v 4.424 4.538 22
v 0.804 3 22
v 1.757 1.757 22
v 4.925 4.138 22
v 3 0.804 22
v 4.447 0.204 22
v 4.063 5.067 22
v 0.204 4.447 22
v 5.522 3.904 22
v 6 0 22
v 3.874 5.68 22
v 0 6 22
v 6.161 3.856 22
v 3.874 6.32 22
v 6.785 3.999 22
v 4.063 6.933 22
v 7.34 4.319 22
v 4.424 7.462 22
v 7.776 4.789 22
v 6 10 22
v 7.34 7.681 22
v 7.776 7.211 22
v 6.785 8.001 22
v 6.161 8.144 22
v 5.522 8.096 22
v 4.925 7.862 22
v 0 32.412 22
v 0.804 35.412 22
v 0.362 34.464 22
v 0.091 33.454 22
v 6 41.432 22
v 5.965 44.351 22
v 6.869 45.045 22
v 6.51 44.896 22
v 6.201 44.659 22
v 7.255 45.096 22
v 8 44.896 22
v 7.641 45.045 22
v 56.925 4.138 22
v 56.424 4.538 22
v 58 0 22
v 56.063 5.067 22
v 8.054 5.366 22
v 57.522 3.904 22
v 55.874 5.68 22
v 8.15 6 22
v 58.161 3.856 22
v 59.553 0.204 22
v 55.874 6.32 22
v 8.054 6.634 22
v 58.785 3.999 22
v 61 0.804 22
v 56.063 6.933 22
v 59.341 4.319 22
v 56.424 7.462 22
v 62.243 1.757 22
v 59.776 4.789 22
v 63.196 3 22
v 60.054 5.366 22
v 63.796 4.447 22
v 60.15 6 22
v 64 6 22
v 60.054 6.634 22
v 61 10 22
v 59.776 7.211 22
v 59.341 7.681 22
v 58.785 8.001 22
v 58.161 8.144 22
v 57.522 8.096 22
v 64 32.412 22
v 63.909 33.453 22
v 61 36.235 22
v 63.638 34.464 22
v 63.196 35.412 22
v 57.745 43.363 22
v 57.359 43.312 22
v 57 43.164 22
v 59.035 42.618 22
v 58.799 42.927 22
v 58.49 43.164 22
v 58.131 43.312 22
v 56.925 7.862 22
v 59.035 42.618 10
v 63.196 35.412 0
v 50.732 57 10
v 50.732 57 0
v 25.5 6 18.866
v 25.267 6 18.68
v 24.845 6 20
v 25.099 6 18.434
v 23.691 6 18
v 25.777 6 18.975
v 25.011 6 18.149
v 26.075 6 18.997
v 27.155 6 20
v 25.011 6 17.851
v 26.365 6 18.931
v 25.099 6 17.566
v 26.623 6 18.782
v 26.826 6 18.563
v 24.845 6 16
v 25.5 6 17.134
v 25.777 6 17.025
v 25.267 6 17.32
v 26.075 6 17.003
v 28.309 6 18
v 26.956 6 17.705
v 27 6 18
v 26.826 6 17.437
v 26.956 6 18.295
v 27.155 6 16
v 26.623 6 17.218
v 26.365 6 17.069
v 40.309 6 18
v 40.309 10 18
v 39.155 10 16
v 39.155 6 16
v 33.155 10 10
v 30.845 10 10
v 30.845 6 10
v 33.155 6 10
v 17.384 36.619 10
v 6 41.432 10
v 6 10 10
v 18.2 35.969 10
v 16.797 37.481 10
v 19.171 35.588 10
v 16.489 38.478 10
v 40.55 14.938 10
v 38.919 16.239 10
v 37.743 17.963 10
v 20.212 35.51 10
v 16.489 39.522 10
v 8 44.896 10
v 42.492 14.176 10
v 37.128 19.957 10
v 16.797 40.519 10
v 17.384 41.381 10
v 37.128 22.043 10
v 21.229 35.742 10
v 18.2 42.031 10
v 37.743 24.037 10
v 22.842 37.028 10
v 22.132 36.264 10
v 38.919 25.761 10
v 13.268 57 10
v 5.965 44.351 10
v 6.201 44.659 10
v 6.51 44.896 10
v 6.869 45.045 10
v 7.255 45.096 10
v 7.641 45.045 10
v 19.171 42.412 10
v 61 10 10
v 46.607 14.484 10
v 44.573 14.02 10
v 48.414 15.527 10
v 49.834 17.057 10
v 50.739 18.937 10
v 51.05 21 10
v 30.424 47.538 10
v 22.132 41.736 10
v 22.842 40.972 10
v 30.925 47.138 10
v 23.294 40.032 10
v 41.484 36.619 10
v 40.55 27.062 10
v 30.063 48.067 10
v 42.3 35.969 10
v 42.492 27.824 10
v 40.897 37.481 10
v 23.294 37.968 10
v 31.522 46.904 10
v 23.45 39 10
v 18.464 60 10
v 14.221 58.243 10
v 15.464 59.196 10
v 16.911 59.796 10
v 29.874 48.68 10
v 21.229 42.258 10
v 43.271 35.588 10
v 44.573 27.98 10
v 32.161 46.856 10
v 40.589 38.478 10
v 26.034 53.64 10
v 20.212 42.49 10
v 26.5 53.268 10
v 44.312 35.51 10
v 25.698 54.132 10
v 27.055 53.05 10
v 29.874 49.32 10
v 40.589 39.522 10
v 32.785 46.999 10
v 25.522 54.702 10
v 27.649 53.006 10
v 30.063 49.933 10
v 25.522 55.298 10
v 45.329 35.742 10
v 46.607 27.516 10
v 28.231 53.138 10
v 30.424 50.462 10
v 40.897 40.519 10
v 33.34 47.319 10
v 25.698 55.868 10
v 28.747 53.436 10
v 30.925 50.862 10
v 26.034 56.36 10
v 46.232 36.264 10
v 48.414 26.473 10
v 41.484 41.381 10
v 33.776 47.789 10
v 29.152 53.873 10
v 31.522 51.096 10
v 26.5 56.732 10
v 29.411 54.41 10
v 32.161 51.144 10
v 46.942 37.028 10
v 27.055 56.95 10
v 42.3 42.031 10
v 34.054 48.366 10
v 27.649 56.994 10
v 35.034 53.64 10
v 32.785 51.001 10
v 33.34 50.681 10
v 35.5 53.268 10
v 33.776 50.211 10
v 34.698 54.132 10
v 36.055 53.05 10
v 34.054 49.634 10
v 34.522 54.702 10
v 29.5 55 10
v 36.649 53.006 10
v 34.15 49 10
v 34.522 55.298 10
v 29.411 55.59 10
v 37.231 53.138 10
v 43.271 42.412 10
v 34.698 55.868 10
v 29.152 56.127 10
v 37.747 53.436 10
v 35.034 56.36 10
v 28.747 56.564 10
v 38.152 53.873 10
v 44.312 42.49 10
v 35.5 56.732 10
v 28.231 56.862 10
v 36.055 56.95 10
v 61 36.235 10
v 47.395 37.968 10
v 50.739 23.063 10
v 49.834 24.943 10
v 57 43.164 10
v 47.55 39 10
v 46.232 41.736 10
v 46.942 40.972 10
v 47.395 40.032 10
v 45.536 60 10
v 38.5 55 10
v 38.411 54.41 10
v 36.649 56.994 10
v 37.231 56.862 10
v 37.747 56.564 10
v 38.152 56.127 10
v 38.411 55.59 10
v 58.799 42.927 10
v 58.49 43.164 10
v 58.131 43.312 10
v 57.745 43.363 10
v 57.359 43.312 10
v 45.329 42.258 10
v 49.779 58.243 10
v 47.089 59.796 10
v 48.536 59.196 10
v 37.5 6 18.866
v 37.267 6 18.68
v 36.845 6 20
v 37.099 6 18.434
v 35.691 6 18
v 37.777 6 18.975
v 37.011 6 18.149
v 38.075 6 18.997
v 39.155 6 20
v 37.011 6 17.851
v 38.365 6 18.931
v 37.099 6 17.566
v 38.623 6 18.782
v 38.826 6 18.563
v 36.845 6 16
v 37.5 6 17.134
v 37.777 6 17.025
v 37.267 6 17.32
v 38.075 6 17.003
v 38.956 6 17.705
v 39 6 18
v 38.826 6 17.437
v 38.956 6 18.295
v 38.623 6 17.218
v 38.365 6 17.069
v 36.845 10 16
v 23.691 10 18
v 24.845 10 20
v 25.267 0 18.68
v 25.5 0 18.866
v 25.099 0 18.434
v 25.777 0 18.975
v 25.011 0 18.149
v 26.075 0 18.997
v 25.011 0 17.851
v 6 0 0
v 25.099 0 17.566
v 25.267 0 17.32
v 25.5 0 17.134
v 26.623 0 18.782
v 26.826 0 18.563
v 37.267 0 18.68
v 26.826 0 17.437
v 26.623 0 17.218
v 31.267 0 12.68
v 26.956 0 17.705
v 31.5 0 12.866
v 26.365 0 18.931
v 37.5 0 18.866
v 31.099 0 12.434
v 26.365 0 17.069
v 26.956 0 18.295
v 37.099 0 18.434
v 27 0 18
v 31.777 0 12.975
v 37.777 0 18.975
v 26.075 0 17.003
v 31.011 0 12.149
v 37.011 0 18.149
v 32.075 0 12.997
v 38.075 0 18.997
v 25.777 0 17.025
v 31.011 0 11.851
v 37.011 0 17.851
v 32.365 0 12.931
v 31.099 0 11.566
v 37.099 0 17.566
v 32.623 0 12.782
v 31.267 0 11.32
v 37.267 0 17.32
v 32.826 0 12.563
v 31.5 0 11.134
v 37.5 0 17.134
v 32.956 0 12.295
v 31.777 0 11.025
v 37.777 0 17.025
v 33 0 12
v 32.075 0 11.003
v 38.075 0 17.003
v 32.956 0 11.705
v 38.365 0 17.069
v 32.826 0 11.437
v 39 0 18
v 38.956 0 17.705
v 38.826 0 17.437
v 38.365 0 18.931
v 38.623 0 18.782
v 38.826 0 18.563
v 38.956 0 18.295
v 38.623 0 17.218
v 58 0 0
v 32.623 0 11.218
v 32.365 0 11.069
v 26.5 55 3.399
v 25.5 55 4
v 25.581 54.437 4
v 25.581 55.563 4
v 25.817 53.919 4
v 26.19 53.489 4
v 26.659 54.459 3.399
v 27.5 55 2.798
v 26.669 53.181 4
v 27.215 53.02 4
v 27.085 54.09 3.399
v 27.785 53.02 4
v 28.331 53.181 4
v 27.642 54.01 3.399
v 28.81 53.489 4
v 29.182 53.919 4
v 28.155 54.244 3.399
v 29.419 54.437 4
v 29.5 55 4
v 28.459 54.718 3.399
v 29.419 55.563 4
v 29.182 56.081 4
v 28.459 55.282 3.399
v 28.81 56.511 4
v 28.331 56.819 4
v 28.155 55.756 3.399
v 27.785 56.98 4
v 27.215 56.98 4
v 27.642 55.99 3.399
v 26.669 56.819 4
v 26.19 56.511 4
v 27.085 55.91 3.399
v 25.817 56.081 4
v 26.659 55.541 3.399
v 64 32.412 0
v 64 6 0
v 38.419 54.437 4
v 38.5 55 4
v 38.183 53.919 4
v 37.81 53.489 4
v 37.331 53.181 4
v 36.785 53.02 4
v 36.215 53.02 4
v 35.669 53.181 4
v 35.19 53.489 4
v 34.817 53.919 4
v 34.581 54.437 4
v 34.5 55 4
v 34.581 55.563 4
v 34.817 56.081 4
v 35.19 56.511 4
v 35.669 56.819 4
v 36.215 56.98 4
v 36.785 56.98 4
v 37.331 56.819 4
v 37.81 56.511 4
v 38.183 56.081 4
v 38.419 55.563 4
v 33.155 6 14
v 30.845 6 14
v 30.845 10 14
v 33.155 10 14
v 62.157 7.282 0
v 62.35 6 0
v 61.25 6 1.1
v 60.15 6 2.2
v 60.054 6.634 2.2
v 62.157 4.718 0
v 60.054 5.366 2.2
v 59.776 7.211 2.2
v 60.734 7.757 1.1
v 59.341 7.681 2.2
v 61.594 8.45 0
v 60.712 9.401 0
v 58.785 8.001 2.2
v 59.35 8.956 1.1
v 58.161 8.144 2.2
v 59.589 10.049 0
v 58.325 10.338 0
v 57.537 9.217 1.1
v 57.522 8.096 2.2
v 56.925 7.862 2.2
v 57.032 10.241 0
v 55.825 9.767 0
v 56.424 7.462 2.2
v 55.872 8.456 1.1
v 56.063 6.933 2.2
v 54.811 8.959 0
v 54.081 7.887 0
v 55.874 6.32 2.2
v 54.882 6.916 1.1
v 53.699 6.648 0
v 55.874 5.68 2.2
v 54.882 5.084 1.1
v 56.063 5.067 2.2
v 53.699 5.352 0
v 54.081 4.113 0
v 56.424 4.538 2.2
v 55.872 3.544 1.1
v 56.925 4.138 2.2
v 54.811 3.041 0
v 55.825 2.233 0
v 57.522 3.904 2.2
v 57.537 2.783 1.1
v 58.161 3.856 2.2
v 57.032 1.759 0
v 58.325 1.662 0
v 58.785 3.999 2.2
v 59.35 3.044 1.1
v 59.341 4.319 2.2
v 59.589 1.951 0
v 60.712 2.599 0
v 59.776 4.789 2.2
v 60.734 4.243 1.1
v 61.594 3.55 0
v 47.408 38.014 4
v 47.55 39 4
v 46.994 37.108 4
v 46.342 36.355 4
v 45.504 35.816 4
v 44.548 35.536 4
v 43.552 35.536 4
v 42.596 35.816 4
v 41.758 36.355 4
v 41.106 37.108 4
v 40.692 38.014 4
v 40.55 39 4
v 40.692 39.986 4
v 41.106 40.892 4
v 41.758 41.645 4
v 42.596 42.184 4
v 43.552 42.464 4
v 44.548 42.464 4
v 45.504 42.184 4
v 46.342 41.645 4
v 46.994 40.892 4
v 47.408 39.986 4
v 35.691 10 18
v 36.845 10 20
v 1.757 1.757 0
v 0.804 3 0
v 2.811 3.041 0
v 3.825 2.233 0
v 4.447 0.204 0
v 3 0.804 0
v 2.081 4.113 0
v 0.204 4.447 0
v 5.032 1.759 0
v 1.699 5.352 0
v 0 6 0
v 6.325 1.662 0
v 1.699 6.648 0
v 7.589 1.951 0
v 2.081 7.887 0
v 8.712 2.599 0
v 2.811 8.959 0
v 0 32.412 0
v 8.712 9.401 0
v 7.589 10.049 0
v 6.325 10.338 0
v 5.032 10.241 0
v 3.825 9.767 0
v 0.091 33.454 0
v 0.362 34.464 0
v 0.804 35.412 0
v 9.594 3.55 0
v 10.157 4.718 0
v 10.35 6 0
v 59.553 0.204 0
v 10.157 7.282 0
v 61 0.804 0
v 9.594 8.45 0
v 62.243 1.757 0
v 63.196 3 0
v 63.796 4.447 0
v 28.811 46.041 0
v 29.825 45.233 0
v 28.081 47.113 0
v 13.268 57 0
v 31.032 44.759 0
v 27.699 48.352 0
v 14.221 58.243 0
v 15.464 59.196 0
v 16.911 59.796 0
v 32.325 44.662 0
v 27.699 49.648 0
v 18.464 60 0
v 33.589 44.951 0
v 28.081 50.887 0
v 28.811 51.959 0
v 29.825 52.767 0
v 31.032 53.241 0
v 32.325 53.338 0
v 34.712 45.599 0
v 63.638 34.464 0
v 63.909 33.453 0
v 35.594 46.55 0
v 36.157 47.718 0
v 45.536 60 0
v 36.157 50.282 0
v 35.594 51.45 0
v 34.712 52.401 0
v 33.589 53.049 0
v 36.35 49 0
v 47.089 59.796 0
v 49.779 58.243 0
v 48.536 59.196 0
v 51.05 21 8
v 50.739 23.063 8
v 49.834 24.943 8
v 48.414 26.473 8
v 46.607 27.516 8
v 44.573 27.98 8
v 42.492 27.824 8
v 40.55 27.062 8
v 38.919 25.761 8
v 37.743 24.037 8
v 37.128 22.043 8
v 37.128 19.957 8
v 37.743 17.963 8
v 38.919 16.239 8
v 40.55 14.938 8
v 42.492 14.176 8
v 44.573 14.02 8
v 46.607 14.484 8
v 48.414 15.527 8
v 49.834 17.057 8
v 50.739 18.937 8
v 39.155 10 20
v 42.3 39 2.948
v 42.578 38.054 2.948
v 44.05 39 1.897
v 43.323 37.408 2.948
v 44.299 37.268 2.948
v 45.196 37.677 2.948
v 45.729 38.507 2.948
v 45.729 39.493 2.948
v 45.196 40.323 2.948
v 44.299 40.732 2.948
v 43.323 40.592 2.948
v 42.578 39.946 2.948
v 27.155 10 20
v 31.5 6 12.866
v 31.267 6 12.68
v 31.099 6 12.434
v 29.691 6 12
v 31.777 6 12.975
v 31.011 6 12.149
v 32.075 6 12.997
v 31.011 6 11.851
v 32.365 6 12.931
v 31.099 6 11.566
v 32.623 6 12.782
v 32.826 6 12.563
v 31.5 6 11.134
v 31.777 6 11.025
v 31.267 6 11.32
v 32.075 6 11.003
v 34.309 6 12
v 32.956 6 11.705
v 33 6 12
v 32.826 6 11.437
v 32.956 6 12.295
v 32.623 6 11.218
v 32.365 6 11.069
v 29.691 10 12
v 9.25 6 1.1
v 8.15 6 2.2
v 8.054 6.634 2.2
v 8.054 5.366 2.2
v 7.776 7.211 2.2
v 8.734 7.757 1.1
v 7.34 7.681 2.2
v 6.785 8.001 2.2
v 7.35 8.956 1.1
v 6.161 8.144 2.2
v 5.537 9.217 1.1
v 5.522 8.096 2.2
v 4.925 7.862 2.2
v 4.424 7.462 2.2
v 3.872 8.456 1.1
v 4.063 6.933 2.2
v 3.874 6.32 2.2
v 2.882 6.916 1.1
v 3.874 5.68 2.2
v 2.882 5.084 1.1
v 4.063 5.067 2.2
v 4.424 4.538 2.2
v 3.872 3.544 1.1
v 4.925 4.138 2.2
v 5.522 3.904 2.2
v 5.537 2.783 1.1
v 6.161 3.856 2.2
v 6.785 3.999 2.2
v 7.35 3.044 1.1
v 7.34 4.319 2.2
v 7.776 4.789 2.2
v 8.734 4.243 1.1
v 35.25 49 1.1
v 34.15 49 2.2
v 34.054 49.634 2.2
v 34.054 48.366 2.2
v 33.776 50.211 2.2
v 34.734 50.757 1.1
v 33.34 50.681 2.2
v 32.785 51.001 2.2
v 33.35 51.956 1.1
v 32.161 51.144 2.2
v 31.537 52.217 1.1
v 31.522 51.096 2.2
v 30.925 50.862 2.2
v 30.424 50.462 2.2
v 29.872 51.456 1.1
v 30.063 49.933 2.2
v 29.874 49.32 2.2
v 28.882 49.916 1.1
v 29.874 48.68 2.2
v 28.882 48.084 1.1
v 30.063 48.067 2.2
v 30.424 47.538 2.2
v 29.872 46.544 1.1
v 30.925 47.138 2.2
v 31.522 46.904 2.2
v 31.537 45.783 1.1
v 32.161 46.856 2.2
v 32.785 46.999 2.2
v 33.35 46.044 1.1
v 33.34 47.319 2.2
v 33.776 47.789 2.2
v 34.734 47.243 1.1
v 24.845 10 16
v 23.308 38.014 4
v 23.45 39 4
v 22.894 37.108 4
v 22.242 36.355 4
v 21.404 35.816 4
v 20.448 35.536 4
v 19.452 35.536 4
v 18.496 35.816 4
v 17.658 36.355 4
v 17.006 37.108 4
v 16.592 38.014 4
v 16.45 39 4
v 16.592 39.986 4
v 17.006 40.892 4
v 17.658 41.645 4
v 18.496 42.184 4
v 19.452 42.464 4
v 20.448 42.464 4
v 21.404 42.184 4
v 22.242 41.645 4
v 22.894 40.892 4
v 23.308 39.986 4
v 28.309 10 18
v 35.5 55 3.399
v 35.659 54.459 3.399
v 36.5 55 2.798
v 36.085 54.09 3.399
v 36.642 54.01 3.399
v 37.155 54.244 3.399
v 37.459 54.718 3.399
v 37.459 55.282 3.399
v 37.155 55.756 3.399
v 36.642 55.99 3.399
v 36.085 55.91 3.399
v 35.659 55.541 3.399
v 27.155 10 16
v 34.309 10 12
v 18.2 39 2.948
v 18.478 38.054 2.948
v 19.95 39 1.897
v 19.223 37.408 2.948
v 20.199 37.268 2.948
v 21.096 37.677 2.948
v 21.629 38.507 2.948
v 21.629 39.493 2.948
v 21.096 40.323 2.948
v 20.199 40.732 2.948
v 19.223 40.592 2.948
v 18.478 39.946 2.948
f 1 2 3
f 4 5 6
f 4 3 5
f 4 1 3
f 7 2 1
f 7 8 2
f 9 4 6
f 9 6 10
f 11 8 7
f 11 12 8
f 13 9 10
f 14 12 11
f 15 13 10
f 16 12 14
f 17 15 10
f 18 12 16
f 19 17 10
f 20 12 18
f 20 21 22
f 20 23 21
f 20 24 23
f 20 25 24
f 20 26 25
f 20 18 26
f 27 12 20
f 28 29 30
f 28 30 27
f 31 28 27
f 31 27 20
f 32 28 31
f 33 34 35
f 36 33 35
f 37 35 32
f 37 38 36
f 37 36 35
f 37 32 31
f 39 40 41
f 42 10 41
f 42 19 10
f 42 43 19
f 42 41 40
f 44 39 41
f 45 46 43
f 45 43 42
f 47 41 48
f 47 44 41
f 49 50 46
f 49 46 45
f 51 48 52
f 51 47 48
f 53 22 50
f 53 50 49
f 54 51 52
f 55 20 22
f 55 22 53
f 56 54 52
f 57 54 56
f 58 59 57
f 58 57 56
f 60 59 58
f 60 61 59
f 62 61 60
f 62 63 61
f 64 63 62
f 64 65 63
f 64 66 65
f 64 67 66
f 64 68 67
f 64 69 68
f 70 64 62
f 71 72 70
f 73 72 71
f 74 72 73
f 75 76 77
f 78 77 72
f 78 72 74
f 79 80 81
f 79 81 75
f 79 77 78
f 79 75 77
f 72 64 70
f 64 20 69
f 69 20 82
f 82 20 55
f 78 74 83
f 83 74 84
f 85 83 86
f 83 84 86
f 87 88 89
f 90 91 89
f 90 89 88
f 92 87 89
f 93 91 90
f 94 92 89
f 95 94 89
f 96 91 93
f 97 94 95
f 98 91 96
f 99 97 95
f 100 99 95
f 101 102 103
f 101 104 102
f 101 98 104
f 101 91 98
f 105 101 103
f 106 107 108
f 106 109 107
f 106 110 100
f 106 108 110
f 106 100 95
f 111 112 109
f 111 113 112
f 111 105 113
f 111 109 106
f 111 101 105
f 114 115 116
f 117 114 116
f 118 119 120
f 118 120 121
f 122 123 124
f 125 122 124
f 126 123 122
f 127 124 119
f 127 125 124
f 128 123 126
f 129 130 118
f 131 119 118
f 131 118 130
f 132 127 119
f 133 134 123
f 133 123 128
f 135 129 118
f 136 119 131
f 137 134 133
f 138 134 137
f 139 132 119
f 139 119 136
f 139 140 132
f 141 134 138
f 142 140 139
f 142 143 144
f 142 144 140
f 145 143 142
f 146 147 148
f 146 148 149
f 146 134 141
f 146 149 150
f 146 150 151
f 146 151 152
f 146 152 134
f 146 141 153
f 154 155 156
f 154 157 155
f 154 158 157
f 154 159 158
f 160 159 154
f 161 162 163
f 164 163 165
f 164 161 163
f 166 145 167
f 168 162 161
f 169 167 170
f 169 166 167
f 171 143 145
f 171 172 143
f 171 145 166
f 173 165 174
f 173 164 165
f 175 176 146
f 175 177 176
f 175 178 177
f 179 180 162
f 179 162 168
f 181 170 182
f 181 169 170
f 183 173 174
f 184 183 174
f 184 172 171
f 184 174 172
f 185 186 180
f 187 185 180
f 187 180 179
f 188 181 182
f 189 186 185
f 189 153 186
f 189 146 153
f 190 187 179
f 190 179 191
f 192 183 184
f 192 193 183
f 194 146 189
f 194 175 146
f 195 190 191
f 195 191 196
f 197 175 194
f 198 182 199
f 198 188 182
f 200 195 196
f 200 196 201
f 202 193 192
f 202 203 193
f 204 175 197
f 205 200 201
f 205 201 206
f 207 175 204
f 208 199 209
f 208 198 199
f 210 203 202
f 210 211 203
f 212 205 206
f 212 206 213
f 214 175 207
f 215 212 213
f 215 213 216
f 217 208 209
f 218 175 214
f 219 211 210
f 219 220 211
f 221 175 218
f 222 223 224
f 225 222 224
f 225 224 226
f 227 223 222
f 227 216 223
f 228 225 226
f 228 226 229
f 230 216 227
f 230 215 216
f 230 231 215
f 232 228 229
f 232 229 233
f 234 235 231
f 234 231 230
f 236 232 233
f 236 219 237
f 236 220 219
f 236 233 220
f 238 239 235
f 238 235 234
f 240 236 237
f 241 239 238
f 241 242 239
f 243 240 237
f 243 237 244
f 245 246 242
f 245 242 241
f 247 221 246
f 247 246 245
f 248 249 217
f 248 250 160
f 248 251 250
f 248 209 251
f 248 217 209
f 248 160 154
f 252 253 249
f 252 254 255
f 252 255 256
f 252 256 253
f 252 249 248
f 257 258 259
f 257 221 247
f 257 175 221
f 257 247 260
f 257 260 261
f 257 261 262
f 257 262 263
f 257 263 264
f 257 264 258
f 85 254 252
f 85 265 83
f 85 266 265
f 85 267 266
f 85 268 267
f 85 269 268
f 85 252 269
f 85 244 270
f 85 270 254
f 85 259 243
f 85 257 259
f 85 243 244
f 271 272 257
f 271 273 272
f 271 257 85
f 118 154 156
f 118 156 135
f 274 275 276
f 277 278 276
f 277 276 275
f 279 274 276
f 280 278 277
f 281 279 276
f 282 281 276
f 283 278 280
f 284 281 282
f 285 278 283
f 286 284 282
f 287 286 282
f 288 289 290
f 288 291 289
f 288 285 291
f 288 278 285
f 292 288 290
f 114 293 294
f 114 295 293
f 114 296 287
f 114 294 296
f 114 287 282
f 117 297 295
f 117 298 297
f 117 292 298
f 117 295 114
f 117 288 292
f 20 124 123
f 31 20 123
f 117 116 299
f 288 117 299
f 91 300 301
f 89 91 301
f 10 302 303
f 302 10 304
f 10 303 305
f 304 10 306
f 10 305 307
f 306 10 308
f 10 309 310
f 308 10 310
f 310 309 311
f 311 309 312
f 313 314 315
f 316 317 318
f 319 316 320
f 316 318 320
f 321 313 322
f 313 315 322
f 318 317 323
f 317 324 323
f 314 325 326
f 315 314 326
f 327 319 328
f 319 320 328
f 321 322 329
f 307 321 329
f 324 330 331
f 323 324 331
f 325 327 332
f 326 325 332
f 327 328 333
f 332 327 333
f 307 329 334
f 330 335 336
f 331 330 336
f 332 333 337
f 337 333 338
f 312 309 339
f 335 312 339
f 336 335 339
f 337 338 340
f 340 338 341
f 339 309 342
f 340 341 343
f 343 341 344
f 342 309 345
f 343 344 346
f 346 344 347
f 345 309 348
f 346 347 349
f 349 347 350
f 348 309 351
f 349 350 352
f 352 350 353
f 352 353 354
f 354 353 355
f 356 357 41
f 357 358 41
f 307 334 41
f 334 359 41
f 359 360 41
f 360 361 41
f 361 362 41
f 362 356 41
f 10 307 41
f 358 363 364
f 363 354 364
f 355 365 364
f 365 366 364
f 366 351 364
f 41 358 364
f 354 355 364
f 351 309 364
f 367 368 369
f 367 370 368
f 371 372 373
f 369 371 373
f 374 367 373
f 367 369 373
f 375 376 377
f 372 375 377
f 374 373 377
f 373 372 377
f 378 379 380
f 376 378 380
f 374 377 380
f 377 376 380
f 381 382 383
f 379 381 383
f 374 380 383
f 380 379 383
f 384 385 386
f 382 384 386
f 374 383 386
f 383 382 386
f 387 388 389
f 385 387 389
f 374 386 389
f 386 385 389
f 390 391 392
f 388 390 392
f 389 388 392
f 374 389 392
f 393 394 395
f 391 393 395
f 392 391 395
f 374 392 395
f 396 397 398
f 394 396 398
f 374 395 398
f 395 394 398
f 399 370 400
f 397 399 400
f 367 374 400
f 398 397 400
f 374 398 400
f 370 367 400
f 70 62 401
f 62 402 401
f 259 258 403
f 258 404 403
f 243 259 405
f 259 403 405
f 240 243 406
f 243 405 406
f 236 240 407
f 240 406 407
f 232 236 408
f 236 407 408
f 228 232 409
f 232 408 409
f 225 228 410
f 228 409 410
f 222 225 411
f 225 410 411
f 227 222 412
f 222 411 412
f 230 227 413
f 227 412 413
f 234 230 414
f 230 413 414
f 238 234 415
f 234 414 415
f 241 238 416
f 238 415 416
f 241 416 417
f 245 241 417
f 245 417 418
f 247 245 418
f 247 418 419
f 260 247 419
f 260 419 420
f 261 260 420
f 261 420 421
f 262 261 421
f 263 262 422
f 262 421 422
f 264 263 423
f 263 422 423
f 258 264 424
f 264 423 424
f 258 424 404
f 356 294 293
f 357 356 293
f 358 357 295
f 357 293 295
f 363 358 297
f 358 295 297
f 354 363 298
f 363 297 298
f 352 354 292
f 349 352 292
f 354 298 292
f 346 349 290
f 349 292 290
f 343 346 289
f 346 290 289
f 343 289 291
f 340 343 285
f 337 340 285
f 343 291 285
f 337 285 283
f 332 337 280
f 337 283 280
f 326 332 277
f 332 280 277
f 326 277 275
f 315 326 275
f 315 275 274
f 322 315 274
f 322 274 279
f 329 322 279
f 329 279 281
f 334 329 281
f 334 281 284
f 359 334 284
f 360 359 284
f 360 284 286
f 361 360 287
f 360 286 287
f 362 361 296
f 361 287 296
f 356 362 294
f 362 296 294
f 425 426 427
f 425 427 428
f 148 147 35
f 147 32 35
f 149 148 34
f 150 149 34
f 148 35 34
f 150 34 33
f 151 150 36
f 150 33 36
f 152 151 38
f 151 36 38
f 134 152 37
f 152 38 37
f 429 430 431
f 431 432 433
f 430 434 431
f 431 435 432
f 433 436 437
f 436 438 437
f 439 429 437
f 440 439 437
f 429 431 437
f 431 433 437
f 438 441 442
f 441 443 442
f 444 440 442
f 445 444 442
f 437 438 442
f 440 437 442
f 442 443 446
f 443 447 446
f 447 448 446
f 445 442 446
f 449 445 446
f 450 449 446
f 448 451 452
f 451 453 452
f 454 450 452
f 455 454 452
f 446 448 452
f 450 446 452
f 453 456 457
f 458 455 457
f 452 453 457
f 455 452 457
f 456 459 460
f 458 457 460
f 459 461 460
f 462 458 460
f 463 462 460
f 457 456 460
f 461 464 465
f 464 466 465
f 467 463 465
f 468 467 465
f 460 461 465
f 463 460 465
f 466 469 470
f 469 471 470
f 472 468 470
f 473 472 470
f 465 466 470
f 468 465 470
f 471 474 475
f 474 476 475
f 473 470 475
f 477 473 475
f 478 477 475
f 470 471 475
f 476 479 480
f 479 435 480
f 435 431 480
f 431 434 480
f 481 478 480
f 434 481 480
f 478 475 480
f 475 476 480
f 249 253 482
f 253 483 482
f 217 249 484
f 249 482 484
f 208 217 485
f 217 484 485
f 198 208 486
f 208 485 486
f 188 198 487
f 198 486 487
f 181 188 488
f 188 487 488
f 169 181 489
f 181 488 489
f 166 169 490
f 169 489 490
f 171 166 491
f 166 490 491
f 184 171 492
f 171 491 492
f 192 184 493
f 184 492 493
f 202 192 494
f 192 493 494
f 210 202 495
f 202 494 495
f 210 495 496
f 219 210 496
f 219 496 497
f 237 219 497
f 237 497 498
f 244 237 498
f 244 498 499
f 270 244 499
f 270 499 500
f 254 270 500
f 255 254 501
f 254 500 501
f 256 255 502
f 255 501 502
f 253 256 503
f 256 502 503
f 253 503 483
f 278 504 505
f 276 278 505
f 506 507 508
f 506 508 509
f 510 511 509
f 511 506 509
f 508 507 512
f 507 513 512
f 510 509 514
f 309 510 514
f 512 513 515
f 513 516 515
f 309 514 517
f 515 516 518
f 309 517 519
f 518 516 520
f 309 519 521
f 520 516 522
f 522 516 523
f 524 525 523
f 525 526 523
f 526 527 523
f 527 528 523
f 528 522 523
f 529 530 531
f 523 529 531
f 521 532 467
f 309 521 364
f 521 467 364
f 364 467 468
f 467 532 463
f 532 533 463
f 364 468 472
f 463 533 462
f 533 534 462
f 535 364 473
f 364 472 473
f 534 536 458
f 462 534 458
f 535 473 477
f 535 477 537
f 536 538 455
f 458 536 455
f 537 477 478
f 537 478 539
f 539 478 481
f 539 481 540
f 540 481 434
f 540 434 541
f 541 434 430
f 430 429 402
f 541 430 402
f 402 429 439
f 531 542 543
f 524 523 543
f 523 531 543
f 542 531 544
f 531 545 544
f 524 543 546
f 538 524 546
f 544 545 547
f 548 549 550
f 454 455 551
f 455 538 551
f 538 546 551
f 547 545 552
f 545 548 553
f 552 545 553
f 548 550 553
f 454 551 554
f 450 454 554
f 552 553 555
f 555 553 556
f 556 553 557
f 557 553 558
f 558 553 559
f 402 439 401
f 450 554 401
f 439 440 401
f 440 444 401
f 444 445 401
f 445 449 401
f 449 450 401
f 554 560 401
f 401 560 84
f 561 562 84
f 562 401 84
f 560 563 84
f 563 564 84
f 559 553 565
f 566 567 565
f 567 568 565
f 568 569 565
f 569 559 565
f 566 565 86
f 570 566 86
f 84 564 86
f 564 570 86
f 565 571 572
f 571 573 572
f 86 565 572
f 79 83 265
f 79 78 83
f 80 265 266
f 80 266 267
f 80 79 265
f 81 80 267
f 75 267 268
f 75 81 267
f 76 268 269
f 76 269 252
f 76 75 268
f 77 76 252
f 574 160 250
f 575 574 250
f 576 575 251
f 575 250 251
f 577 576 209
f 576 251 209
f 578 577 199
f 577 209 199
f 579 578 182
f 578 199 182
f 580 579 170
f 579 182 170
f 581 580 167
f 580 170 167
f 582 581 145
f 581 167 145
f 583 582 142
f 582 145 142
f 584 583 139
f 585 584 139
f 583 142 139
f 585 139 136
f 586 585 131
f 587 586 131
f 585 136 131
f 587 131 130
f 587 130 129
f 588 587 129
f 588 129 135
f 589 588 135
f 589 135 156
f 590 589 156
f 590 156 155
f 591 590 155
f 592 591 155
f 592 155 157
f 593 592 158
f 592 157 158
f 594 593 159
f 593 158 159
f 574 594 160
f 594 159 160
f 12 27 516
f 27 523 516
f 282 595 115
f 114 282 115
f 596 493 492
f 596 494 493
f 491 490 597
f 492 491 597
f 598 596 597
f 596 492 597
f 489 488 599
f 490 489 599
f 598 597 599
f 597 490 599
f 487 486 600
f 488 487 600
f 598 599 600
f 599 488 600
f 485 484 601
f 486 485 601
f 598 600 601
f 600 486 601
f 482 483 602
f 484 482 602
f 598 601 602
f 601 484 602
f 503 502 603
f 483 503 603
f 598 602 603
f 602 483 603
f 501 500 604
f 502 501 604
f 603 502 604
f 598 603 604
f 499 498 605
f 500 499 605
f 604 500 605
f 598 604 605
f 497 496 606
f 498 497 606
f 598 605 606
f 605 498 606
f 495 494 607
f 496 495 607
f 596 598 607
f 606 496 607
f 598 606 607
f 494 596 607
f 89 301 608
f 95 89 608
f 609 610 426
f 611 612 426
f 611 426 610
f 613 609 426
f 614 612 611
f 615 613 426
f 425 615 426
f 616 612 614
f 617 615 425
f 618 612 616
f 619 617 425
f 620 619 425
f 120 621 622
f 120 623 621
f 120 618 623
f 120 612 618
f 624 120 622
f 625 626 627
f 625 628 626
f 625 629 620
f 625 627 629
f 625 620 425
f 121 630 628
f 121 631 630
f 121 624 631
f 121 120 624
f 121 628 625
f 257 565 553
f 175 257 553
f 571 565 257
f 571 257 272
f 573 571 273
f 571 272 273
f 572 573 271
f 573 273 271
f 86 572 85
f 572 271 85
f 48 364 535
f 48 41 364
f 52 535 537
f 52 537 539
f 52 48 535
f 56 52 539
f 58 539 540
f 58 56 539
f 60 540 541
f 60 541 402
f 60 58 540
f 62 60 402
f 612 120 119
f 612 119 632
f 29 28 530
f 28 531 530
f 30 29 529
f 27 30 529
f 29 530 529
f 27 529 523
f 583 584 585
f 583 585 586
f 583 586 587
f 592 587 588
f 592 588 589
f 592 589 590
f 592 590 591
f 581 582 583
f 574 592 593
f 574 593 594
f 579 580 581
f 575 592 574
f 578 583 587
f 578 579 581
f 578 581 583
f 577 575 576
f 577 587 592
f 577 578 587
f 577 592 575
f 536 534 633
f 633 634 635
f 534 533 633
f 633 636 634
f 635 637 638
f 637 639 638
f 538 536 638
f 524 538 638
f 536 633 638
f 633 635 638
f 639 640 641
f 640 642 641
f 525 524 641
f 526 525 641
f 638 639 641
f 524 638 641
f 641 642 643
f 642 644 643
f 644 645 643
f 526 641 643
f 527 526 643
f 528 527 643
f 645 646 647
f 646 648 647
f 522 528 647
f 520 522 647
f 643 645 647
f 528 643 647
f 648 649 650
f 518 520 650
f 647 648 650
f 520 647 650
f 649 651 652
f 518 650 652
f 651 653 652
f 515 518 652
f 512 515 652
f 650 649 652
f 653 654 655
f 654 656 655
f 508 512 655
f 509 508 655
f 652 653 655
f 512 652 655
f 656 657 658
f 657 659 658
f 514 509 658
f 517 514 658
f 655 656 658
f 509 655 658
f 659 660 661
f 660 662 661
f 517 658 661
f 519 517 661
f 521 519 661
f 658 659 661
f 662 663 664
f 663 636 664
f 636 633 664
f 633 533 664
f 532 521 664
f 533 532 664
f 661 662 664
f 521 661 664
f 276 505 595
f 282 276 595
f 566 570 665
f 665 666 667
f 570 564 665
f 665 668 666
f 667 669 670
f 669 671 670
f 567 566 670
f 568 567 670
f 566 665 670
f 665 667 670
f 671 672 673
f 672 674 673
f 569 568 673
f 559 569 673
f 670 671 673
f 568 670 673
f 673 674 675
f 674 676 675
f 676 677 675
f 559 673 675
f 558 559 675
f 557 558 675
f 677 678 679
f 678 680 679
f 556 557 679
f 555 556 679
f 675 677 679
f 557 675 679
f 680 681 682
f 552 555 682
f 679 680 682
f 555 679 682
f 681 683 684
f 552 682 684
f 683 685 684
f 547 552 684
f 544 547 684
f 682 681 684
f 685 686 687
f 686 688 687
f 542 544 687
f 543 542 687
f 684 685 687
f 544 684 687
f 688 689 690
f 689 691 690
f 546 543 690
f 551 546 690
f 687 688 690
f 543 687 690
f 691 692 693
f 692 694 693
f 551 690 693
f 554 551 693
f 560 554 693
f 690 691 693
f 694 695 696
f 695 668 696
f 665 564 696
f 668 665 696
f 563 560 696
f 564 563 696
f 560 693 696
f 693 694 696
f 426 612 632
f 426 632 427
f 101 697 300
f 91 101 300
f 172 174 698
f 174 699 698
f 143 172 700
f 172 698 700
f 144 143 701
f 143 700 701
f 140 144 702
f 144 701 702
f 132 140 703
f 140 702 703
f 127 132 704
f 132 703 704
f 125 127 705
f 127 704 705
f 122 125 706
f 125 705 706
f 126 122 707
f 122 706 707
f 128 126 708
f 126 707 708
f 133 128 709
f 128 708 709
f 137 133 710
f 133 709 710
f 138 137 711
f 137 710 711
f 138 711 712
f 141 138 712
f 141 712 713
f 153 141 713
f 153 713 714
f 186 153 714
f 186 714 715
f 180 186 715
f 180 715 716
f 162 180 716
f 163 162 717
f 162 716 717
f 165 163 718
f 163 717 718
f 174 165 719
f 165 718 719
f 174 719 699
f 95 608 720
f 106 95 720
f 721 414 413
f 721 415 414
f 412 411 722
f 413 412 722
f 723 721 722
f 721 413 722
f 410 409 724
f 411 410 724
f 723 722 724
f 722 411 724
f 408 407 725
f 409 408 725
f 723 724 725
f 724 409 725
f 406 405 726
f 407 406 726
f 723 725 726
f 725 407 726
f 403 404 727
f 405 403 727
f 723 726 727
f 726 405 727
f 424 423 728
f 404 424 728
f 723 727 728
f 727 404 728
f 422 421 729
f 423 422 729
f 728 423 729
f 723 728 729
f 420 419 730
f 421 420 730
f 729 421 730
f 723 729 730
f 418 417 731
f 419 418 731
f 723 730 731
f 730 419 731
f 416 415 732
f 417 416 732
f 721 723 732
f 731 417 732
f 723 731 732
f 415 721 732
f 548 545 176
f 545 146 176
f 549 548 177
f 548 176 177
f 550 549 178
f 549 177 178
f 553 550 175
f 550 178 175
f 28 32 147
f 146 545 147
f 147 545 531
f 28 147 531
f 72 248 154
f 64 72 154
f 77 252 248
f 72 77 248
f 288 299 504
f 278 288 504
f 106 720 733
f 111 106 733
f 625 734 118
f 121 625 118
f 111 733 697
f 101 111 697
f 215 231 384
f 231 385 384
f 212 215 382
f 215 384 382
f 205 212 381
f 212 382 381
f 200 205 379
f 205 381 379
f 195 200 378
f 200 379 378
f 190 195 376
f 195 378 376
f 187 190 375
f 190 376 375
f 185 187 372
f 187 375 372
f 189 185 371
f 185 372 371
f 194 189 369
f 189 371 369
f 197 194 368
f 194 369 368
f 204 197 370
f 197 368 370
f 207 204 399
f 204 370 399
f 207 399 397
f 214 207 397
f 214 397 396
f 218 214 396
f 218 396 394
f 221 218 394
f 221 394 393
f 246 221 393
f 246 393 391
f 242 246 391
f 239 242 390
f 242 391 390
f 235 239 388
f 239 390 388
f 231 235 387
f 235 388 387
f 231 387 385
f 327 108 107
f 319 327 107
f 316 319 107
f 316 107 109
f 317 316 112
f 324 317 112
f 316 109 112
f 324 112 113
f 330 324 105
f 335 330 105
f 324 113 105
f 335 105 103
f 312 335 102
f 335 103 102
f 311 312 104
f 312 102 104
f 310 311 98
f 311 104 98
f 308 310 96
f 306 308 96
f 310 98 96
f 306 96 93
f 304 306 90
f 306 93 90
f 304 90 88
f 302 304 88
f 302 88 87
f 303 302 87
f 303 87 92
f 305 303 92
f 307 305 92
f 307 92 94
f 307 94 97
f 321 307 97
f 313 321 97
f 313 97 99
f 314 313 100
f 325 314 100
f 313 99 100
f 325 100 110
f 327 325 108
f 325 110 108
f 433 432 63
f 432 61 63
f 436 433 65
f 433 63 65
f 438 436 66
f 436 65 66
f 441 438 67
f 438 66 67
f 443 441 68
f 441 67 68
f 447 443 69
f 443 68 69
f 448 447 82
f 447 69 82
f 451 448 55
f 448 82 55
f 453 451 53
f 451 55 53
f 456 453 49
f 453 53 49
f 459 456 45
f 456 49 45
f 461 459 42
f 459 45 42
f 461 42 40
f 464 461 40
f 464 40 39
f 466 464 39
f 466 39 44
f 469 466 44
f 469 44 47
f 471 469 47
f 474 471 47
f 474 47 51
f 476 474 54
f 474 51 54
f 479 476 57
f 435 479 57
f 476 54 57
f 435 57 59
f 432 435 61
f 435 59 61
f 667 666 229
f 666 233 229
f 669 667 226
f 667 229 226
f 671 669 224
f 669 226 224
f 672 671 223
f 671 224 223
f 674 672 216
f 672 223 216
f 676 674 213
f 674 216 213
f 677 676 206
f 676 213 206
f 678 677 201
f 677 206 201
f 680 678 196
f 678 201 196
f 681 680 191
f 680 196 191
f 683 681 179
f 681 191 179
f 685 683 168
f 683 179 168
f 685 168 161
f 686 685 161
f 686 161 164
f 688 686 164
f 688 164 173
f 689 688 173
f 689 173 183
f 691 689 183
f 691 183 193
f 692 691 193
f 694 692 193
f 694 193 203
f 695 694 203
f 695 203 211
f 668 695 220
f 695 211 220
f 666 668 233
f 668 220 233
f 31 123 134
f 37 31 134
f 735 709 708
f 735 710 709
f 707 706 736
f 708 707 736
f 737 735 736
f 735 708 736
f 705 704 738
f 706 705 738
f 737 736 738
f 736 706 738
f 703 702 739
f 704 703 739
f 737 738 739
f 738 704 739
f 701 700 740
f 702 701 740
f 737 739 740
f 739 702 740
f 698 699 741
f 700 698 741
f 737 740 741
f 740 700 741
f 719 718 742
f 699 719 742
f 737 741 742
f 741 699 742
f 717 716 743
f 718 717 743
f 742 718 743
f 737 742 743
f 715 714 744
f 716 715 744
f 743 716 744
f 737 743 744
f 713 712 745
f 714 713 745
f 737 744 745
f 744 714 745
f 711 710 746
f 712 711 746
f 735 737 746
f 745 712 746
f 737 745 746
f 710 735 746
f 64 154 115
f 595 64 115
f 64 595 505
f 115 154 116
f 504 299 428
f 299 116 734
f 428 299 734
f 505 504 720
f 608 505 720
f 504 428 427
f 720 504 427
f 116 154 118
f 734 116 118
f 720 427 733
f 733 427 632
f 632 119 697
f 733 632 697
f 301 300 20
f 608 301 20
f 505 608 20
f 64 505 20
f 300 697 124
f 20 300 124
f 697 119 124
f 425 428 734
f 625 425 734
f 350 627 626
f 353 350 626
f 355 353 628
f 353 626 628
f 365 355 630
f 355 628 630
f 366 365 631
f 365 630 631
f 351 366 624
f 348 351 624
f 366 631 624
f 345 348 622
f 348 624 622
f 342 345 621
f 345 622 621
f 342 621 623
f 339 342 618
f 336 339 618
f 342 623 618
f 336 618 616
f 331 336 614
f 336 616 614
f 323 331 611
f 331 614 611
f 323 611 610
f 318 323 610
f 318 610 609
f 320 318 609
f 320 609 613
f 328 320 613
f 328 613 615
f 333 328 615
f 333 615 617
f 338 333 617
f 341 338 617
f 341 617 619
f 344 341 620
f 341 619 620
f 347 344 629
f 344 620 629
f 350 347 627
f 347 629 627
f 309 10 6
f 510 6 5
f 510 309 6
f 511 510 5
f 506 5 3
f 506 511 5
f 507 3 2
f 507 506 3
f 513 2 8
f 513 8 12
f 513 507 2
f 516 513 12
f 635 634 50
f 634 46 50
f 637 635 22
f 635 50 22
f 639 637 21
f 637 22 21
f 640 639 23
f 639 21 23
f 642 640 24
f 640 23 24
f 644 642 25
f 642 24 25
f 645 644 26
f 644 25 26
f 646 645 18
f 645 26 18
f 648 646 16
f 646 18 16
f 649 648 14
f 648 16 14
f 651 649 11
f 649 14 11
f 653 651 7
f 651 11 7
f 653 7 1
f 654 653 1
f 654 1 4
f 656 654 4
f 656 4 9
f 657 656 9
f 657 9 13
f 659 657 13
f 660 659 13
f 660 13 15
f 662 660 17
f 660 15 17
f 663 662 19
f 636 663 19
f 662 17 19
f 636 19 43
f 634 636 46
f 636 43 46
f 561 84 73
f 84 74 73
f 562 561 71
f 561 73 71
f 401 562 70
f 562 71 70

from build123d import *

# Parameters (mm, degrees)
EXTRUDE_1_DEPTH             = 10
EXTRUDE_2_DEPTH             = 12
FILLET_1_R                  = 6
FILLET_2_R                  = 1.49
HOLE_WIZARD_M44_D           = 4.3
HOLE_WIZARD_M44_CSINK_D     = 8.7
HOLE_WIZARD_M44_CSINK_ANGLE = 90
HOLE_WIZARD_4_0_2_D         = 4
HOLE_WIZARD_4_0_2_DEPTH     = 6
HOLE_WIZARD_4_0_2_TIP       = 1.2017212380551205
HOLE_WIZARD_7_0_7_1_D       = 7
HOLE_WIZARD_7_0_7_1_DEPTH   = 6
HOLE_WIZARD_7_0_7_1_TIP     = 2.103012166596461
SKETCH_54_R                 = 6.999999999999999
CUT_EXTRUDE_5_DEPTH         = 2
HOLE_WIZARD_M2_21_D         = 2
HOLE_WIZARD_M2_21_DEPTH     = 10
HOLE_WIZARD_M2_21_TIP       = 0.6008606190275603
CUT_EXTRUDE_11_DEPTH        = 4
HOLE_WIZARD_M2_22_D         = 2
HOLE_WIZARD_M2_22_DEPTH     = 10
HOLE_WIZARD_M2_22_TIP       = 0.6008606190275603
CUT_EXTRUDE_12_DEPTH        = 4


with BuildPart() as part:
    # Эскиз1 → Бобышка-Вытянуть1 (new body)
    with BuildSketch(Plane.XY):
        Polygon((0, 0), (64, 0), (64.00000000000001, 34.01923788646688), (48.99999999999994, 59.99999999999999), (14.999999999999943, 59.99999999999999), (0, 34.02), align=None)
    extrude(amount=EXTRUDE_1_DEPTH)

    # Эскиз3 → Бобышка-Вытянуть2 (add)
    with BuildSketch(Plane.XY.offset(10)):
        Polygon((0, 0), (64, 0), (64.00000000000001, 34.01923788646688), (58.29037785163881, 43.90859353944907), (57, 43.16359353944907), (60.99999999999999, 36.23539030917355), (61.00000000000001, 9.999999999999998), (6.000000000000005, 9.999999999999993), (6, 41.43206556072121), (8.000044001452048, 44.896141771236174), (6.709675613035229, 45.64115816177706), (0, 34.02), align=None)
    extrude(amount=EXTRUDE_2_DEPTH)

    # Скругление1
    fillet_1_edges = [part.edges().sort_by_distance(p)[0] for p in [
        (0, 34.02, 11),
        (14.999999999999943, 59.99999999999999, 5),
        (48.99999999999994, 59.99999999999999, 5),
        (64.00000000000001, 34.01923788646688, 11),
        (64, 0, 11),
        (0, 0, 11),
    ]]
    fillet(fillet_1_edges, radius=FILLET_1_R)

    # Скругление2
    fillet_2_edges = [part.edges().sort_by_distance(p)[0] for p in [
        (58.29037785163881, 43.90859353944907, 16),
        (6.709675613035229, 45.64115816177706, 16),
    ]]
    fillet(fillet_2_edges, radius=FILLET_2_R - 0.0001)  # a hair under: the kernel refuses the full size

    # Зенковка для  винта с плоской головкой M44 (through all)
    with Locations(Plane(origin=(0, 0, 0), x_dir=(-1, 0, 0), z_dir=(0, 0, -1))):
        with Locations((-5.999949191, 6), (-58, 6), (-31.999974596, 49)):
            CounterSinkHole(HOLE_WIZARD_M44_D / 2, HOLE_WIZARD_M44_CSINK_D / 2, counter_sink_angle=HOLE_WIZARD_M44_CSINK_ANGLE)

    # Отверстия под штифты Ø4.0 мм2
    with Locations(Plane(origin=(0, 0, 10), x_dir=(-1, 0, 0), z_dir=(0, 0, 1))):
        with Locations((-36.5, -55), (-27.499949191, -55)):
            Hole(HOLE_WIZARD_4_0_2_D / 2, depth=HOLE_WIZARD_4_0_2_DEPTH)
            with Locations((0, 0, -(HOLE_WIZARD_4_0_2_DEPTH + HOLE_WIZARD_4_0_2_TIP / 2))):  # 118° drill point
                Cone(0, HOLE_WIZARD_4_0_2_D / 2, HOLE_WIZARD_4_0_2_TIP, mode=Mode.SUBTRACT)

    # Диаметр отверстия Ø7.0 (7)1
    with Locations(Plane(origin=(0, 0, 10), x_dir=(-1, 0, 0), z_dir=(0, 0, 1))):
        with Locations((-44.05, -39), (-19.949949191, -39)):
            Hole(HOLE_WIZARD_7_0_7_1_D / 2, depth=HOLE_WIZARD_7_0_7_1_DEPTH)
            with Locations((0, 0, -(HOLE_WIZARD_7_0_7_1_DEPTH + HOLE_WIZARD_7_0_7_1_TIP / 2))):  # 118° drill point
                Cone(0, HOLE_WIZARD_7_0_7_1_D / 2, HOLE_WIZARD_7_0_7_1_TIP, mode=Mode.SUBTRACT)

    # Эскиз54 → Вырез-Вытянуть5 (cut)
    with BuildSketch(Plane.XY.offset(10)):
        with Locations((44.050000000000004, 21)):
            Circle(SKETCH_54_R)
    extrude(amount=-CUT_EXTRUDE_5_DEPTH, mode=Mode.SUBTRACT)

    # Сверло под метчик  спиральное M2.21
    with Locations(Plane(origin=(0, 0, 0), x_dir=(-1, 0, 0), z_dir=(0, -1, 0))):
        with Locations((-26, -18), (-38, -18)):
            Hole(HOLE_WIZARD_M2_21_D / 2, depth=HOLE_WIZARD_M2_21_DEPTH)
            with Locations((0, 0, -(HOLE_WIZARD_M2_21_DEPTH + HOLE_WIZARD_M2_21_TIP / 2))):  # 118° drill point
                Cone(0, HOLE_WIZARD_M2_21_D / 2, HOLE_WIZARD_M2_21_TIP, mode=Mode.SUBTRACT)

    # Эскиз58 → Вырез-Вытянуть11 (cut)
    with BuildSketch(Plane(origin=(-9.5e-16, 9.999999999999993, 0), x_dir=(1, 9e-17, 0), z_dir=(-9e-17, 1, 0))):
        Polygon((28.309401076758505, -17.999999999999993), (27.154700538379252, -15.99999999999999), (24.845299461620748, -15.999999999999986), (23.690598923241495, -17.999999999999986), (24.845299461620744, -19.999999999999982), (27.154700538379256, -19.999999999999986), align=None)
        Polygon((40.3094010767585, -17.999999999999993), (39.154700538379245, -15.999999999999993), (36.845299461620755, -15.99999999999999), (35.6905989232415, -17.999999999999996), (36.84529946162075, -19.999999999999993), (39.15470053837924, -19.999999999999996), align=None)
    extrude(amount=-CUT_EXTRUDE_11_DEPTH, mode=Mode.SUBTRACT)

    # Сверло под метчик  спиральное M2.22
    with Locations(Plane(origin=(0, 0, 0), x_dir=(-1, 0, 0), z_dir=(0, -1, 0))):
        with Locations((-32, -12)):
            Hole(HOLE_WIZARD_M2_22_D / 2, depth=HOLE_WIZARD_M2_22_DEPTH)
            with Locations((0, 0, -(HOLE_WIZARD_M2_22_DEPTH + HOLE_WIZARD_M2_22_TIP / 2))):  # 118° drill point
                Cone(0, HOLE_WIZARD_M2_22_D / 2, HOLE_WIZARD_M2_22_TIP, mode=Mode.SUBTRACT)

    # Эскиз61 → Вырез-Вытянуть12 (cut)
    with BuildSketch(Plane(origin=(-9.5e-16, 9.999999999999993, 0), x_dir=(1, 9e-17, 0), z_dir=(-9e-17, 1, 0))):
        Polygon((34.3094010767585, -11.999999999999998), (33.15470053837925, -10.000000000000002), (30.84529946162075, -9.999999999999998), (29.690598923241495, -11.999999999999996), (30.845299461620744, -13.999999999999996), (33.15470053837924, -14), align=None)
    extrude(amount=-CUT_EXTRUDE_12_DEPTH, mode=Mode.SUBTRACT)


solid = part.part
